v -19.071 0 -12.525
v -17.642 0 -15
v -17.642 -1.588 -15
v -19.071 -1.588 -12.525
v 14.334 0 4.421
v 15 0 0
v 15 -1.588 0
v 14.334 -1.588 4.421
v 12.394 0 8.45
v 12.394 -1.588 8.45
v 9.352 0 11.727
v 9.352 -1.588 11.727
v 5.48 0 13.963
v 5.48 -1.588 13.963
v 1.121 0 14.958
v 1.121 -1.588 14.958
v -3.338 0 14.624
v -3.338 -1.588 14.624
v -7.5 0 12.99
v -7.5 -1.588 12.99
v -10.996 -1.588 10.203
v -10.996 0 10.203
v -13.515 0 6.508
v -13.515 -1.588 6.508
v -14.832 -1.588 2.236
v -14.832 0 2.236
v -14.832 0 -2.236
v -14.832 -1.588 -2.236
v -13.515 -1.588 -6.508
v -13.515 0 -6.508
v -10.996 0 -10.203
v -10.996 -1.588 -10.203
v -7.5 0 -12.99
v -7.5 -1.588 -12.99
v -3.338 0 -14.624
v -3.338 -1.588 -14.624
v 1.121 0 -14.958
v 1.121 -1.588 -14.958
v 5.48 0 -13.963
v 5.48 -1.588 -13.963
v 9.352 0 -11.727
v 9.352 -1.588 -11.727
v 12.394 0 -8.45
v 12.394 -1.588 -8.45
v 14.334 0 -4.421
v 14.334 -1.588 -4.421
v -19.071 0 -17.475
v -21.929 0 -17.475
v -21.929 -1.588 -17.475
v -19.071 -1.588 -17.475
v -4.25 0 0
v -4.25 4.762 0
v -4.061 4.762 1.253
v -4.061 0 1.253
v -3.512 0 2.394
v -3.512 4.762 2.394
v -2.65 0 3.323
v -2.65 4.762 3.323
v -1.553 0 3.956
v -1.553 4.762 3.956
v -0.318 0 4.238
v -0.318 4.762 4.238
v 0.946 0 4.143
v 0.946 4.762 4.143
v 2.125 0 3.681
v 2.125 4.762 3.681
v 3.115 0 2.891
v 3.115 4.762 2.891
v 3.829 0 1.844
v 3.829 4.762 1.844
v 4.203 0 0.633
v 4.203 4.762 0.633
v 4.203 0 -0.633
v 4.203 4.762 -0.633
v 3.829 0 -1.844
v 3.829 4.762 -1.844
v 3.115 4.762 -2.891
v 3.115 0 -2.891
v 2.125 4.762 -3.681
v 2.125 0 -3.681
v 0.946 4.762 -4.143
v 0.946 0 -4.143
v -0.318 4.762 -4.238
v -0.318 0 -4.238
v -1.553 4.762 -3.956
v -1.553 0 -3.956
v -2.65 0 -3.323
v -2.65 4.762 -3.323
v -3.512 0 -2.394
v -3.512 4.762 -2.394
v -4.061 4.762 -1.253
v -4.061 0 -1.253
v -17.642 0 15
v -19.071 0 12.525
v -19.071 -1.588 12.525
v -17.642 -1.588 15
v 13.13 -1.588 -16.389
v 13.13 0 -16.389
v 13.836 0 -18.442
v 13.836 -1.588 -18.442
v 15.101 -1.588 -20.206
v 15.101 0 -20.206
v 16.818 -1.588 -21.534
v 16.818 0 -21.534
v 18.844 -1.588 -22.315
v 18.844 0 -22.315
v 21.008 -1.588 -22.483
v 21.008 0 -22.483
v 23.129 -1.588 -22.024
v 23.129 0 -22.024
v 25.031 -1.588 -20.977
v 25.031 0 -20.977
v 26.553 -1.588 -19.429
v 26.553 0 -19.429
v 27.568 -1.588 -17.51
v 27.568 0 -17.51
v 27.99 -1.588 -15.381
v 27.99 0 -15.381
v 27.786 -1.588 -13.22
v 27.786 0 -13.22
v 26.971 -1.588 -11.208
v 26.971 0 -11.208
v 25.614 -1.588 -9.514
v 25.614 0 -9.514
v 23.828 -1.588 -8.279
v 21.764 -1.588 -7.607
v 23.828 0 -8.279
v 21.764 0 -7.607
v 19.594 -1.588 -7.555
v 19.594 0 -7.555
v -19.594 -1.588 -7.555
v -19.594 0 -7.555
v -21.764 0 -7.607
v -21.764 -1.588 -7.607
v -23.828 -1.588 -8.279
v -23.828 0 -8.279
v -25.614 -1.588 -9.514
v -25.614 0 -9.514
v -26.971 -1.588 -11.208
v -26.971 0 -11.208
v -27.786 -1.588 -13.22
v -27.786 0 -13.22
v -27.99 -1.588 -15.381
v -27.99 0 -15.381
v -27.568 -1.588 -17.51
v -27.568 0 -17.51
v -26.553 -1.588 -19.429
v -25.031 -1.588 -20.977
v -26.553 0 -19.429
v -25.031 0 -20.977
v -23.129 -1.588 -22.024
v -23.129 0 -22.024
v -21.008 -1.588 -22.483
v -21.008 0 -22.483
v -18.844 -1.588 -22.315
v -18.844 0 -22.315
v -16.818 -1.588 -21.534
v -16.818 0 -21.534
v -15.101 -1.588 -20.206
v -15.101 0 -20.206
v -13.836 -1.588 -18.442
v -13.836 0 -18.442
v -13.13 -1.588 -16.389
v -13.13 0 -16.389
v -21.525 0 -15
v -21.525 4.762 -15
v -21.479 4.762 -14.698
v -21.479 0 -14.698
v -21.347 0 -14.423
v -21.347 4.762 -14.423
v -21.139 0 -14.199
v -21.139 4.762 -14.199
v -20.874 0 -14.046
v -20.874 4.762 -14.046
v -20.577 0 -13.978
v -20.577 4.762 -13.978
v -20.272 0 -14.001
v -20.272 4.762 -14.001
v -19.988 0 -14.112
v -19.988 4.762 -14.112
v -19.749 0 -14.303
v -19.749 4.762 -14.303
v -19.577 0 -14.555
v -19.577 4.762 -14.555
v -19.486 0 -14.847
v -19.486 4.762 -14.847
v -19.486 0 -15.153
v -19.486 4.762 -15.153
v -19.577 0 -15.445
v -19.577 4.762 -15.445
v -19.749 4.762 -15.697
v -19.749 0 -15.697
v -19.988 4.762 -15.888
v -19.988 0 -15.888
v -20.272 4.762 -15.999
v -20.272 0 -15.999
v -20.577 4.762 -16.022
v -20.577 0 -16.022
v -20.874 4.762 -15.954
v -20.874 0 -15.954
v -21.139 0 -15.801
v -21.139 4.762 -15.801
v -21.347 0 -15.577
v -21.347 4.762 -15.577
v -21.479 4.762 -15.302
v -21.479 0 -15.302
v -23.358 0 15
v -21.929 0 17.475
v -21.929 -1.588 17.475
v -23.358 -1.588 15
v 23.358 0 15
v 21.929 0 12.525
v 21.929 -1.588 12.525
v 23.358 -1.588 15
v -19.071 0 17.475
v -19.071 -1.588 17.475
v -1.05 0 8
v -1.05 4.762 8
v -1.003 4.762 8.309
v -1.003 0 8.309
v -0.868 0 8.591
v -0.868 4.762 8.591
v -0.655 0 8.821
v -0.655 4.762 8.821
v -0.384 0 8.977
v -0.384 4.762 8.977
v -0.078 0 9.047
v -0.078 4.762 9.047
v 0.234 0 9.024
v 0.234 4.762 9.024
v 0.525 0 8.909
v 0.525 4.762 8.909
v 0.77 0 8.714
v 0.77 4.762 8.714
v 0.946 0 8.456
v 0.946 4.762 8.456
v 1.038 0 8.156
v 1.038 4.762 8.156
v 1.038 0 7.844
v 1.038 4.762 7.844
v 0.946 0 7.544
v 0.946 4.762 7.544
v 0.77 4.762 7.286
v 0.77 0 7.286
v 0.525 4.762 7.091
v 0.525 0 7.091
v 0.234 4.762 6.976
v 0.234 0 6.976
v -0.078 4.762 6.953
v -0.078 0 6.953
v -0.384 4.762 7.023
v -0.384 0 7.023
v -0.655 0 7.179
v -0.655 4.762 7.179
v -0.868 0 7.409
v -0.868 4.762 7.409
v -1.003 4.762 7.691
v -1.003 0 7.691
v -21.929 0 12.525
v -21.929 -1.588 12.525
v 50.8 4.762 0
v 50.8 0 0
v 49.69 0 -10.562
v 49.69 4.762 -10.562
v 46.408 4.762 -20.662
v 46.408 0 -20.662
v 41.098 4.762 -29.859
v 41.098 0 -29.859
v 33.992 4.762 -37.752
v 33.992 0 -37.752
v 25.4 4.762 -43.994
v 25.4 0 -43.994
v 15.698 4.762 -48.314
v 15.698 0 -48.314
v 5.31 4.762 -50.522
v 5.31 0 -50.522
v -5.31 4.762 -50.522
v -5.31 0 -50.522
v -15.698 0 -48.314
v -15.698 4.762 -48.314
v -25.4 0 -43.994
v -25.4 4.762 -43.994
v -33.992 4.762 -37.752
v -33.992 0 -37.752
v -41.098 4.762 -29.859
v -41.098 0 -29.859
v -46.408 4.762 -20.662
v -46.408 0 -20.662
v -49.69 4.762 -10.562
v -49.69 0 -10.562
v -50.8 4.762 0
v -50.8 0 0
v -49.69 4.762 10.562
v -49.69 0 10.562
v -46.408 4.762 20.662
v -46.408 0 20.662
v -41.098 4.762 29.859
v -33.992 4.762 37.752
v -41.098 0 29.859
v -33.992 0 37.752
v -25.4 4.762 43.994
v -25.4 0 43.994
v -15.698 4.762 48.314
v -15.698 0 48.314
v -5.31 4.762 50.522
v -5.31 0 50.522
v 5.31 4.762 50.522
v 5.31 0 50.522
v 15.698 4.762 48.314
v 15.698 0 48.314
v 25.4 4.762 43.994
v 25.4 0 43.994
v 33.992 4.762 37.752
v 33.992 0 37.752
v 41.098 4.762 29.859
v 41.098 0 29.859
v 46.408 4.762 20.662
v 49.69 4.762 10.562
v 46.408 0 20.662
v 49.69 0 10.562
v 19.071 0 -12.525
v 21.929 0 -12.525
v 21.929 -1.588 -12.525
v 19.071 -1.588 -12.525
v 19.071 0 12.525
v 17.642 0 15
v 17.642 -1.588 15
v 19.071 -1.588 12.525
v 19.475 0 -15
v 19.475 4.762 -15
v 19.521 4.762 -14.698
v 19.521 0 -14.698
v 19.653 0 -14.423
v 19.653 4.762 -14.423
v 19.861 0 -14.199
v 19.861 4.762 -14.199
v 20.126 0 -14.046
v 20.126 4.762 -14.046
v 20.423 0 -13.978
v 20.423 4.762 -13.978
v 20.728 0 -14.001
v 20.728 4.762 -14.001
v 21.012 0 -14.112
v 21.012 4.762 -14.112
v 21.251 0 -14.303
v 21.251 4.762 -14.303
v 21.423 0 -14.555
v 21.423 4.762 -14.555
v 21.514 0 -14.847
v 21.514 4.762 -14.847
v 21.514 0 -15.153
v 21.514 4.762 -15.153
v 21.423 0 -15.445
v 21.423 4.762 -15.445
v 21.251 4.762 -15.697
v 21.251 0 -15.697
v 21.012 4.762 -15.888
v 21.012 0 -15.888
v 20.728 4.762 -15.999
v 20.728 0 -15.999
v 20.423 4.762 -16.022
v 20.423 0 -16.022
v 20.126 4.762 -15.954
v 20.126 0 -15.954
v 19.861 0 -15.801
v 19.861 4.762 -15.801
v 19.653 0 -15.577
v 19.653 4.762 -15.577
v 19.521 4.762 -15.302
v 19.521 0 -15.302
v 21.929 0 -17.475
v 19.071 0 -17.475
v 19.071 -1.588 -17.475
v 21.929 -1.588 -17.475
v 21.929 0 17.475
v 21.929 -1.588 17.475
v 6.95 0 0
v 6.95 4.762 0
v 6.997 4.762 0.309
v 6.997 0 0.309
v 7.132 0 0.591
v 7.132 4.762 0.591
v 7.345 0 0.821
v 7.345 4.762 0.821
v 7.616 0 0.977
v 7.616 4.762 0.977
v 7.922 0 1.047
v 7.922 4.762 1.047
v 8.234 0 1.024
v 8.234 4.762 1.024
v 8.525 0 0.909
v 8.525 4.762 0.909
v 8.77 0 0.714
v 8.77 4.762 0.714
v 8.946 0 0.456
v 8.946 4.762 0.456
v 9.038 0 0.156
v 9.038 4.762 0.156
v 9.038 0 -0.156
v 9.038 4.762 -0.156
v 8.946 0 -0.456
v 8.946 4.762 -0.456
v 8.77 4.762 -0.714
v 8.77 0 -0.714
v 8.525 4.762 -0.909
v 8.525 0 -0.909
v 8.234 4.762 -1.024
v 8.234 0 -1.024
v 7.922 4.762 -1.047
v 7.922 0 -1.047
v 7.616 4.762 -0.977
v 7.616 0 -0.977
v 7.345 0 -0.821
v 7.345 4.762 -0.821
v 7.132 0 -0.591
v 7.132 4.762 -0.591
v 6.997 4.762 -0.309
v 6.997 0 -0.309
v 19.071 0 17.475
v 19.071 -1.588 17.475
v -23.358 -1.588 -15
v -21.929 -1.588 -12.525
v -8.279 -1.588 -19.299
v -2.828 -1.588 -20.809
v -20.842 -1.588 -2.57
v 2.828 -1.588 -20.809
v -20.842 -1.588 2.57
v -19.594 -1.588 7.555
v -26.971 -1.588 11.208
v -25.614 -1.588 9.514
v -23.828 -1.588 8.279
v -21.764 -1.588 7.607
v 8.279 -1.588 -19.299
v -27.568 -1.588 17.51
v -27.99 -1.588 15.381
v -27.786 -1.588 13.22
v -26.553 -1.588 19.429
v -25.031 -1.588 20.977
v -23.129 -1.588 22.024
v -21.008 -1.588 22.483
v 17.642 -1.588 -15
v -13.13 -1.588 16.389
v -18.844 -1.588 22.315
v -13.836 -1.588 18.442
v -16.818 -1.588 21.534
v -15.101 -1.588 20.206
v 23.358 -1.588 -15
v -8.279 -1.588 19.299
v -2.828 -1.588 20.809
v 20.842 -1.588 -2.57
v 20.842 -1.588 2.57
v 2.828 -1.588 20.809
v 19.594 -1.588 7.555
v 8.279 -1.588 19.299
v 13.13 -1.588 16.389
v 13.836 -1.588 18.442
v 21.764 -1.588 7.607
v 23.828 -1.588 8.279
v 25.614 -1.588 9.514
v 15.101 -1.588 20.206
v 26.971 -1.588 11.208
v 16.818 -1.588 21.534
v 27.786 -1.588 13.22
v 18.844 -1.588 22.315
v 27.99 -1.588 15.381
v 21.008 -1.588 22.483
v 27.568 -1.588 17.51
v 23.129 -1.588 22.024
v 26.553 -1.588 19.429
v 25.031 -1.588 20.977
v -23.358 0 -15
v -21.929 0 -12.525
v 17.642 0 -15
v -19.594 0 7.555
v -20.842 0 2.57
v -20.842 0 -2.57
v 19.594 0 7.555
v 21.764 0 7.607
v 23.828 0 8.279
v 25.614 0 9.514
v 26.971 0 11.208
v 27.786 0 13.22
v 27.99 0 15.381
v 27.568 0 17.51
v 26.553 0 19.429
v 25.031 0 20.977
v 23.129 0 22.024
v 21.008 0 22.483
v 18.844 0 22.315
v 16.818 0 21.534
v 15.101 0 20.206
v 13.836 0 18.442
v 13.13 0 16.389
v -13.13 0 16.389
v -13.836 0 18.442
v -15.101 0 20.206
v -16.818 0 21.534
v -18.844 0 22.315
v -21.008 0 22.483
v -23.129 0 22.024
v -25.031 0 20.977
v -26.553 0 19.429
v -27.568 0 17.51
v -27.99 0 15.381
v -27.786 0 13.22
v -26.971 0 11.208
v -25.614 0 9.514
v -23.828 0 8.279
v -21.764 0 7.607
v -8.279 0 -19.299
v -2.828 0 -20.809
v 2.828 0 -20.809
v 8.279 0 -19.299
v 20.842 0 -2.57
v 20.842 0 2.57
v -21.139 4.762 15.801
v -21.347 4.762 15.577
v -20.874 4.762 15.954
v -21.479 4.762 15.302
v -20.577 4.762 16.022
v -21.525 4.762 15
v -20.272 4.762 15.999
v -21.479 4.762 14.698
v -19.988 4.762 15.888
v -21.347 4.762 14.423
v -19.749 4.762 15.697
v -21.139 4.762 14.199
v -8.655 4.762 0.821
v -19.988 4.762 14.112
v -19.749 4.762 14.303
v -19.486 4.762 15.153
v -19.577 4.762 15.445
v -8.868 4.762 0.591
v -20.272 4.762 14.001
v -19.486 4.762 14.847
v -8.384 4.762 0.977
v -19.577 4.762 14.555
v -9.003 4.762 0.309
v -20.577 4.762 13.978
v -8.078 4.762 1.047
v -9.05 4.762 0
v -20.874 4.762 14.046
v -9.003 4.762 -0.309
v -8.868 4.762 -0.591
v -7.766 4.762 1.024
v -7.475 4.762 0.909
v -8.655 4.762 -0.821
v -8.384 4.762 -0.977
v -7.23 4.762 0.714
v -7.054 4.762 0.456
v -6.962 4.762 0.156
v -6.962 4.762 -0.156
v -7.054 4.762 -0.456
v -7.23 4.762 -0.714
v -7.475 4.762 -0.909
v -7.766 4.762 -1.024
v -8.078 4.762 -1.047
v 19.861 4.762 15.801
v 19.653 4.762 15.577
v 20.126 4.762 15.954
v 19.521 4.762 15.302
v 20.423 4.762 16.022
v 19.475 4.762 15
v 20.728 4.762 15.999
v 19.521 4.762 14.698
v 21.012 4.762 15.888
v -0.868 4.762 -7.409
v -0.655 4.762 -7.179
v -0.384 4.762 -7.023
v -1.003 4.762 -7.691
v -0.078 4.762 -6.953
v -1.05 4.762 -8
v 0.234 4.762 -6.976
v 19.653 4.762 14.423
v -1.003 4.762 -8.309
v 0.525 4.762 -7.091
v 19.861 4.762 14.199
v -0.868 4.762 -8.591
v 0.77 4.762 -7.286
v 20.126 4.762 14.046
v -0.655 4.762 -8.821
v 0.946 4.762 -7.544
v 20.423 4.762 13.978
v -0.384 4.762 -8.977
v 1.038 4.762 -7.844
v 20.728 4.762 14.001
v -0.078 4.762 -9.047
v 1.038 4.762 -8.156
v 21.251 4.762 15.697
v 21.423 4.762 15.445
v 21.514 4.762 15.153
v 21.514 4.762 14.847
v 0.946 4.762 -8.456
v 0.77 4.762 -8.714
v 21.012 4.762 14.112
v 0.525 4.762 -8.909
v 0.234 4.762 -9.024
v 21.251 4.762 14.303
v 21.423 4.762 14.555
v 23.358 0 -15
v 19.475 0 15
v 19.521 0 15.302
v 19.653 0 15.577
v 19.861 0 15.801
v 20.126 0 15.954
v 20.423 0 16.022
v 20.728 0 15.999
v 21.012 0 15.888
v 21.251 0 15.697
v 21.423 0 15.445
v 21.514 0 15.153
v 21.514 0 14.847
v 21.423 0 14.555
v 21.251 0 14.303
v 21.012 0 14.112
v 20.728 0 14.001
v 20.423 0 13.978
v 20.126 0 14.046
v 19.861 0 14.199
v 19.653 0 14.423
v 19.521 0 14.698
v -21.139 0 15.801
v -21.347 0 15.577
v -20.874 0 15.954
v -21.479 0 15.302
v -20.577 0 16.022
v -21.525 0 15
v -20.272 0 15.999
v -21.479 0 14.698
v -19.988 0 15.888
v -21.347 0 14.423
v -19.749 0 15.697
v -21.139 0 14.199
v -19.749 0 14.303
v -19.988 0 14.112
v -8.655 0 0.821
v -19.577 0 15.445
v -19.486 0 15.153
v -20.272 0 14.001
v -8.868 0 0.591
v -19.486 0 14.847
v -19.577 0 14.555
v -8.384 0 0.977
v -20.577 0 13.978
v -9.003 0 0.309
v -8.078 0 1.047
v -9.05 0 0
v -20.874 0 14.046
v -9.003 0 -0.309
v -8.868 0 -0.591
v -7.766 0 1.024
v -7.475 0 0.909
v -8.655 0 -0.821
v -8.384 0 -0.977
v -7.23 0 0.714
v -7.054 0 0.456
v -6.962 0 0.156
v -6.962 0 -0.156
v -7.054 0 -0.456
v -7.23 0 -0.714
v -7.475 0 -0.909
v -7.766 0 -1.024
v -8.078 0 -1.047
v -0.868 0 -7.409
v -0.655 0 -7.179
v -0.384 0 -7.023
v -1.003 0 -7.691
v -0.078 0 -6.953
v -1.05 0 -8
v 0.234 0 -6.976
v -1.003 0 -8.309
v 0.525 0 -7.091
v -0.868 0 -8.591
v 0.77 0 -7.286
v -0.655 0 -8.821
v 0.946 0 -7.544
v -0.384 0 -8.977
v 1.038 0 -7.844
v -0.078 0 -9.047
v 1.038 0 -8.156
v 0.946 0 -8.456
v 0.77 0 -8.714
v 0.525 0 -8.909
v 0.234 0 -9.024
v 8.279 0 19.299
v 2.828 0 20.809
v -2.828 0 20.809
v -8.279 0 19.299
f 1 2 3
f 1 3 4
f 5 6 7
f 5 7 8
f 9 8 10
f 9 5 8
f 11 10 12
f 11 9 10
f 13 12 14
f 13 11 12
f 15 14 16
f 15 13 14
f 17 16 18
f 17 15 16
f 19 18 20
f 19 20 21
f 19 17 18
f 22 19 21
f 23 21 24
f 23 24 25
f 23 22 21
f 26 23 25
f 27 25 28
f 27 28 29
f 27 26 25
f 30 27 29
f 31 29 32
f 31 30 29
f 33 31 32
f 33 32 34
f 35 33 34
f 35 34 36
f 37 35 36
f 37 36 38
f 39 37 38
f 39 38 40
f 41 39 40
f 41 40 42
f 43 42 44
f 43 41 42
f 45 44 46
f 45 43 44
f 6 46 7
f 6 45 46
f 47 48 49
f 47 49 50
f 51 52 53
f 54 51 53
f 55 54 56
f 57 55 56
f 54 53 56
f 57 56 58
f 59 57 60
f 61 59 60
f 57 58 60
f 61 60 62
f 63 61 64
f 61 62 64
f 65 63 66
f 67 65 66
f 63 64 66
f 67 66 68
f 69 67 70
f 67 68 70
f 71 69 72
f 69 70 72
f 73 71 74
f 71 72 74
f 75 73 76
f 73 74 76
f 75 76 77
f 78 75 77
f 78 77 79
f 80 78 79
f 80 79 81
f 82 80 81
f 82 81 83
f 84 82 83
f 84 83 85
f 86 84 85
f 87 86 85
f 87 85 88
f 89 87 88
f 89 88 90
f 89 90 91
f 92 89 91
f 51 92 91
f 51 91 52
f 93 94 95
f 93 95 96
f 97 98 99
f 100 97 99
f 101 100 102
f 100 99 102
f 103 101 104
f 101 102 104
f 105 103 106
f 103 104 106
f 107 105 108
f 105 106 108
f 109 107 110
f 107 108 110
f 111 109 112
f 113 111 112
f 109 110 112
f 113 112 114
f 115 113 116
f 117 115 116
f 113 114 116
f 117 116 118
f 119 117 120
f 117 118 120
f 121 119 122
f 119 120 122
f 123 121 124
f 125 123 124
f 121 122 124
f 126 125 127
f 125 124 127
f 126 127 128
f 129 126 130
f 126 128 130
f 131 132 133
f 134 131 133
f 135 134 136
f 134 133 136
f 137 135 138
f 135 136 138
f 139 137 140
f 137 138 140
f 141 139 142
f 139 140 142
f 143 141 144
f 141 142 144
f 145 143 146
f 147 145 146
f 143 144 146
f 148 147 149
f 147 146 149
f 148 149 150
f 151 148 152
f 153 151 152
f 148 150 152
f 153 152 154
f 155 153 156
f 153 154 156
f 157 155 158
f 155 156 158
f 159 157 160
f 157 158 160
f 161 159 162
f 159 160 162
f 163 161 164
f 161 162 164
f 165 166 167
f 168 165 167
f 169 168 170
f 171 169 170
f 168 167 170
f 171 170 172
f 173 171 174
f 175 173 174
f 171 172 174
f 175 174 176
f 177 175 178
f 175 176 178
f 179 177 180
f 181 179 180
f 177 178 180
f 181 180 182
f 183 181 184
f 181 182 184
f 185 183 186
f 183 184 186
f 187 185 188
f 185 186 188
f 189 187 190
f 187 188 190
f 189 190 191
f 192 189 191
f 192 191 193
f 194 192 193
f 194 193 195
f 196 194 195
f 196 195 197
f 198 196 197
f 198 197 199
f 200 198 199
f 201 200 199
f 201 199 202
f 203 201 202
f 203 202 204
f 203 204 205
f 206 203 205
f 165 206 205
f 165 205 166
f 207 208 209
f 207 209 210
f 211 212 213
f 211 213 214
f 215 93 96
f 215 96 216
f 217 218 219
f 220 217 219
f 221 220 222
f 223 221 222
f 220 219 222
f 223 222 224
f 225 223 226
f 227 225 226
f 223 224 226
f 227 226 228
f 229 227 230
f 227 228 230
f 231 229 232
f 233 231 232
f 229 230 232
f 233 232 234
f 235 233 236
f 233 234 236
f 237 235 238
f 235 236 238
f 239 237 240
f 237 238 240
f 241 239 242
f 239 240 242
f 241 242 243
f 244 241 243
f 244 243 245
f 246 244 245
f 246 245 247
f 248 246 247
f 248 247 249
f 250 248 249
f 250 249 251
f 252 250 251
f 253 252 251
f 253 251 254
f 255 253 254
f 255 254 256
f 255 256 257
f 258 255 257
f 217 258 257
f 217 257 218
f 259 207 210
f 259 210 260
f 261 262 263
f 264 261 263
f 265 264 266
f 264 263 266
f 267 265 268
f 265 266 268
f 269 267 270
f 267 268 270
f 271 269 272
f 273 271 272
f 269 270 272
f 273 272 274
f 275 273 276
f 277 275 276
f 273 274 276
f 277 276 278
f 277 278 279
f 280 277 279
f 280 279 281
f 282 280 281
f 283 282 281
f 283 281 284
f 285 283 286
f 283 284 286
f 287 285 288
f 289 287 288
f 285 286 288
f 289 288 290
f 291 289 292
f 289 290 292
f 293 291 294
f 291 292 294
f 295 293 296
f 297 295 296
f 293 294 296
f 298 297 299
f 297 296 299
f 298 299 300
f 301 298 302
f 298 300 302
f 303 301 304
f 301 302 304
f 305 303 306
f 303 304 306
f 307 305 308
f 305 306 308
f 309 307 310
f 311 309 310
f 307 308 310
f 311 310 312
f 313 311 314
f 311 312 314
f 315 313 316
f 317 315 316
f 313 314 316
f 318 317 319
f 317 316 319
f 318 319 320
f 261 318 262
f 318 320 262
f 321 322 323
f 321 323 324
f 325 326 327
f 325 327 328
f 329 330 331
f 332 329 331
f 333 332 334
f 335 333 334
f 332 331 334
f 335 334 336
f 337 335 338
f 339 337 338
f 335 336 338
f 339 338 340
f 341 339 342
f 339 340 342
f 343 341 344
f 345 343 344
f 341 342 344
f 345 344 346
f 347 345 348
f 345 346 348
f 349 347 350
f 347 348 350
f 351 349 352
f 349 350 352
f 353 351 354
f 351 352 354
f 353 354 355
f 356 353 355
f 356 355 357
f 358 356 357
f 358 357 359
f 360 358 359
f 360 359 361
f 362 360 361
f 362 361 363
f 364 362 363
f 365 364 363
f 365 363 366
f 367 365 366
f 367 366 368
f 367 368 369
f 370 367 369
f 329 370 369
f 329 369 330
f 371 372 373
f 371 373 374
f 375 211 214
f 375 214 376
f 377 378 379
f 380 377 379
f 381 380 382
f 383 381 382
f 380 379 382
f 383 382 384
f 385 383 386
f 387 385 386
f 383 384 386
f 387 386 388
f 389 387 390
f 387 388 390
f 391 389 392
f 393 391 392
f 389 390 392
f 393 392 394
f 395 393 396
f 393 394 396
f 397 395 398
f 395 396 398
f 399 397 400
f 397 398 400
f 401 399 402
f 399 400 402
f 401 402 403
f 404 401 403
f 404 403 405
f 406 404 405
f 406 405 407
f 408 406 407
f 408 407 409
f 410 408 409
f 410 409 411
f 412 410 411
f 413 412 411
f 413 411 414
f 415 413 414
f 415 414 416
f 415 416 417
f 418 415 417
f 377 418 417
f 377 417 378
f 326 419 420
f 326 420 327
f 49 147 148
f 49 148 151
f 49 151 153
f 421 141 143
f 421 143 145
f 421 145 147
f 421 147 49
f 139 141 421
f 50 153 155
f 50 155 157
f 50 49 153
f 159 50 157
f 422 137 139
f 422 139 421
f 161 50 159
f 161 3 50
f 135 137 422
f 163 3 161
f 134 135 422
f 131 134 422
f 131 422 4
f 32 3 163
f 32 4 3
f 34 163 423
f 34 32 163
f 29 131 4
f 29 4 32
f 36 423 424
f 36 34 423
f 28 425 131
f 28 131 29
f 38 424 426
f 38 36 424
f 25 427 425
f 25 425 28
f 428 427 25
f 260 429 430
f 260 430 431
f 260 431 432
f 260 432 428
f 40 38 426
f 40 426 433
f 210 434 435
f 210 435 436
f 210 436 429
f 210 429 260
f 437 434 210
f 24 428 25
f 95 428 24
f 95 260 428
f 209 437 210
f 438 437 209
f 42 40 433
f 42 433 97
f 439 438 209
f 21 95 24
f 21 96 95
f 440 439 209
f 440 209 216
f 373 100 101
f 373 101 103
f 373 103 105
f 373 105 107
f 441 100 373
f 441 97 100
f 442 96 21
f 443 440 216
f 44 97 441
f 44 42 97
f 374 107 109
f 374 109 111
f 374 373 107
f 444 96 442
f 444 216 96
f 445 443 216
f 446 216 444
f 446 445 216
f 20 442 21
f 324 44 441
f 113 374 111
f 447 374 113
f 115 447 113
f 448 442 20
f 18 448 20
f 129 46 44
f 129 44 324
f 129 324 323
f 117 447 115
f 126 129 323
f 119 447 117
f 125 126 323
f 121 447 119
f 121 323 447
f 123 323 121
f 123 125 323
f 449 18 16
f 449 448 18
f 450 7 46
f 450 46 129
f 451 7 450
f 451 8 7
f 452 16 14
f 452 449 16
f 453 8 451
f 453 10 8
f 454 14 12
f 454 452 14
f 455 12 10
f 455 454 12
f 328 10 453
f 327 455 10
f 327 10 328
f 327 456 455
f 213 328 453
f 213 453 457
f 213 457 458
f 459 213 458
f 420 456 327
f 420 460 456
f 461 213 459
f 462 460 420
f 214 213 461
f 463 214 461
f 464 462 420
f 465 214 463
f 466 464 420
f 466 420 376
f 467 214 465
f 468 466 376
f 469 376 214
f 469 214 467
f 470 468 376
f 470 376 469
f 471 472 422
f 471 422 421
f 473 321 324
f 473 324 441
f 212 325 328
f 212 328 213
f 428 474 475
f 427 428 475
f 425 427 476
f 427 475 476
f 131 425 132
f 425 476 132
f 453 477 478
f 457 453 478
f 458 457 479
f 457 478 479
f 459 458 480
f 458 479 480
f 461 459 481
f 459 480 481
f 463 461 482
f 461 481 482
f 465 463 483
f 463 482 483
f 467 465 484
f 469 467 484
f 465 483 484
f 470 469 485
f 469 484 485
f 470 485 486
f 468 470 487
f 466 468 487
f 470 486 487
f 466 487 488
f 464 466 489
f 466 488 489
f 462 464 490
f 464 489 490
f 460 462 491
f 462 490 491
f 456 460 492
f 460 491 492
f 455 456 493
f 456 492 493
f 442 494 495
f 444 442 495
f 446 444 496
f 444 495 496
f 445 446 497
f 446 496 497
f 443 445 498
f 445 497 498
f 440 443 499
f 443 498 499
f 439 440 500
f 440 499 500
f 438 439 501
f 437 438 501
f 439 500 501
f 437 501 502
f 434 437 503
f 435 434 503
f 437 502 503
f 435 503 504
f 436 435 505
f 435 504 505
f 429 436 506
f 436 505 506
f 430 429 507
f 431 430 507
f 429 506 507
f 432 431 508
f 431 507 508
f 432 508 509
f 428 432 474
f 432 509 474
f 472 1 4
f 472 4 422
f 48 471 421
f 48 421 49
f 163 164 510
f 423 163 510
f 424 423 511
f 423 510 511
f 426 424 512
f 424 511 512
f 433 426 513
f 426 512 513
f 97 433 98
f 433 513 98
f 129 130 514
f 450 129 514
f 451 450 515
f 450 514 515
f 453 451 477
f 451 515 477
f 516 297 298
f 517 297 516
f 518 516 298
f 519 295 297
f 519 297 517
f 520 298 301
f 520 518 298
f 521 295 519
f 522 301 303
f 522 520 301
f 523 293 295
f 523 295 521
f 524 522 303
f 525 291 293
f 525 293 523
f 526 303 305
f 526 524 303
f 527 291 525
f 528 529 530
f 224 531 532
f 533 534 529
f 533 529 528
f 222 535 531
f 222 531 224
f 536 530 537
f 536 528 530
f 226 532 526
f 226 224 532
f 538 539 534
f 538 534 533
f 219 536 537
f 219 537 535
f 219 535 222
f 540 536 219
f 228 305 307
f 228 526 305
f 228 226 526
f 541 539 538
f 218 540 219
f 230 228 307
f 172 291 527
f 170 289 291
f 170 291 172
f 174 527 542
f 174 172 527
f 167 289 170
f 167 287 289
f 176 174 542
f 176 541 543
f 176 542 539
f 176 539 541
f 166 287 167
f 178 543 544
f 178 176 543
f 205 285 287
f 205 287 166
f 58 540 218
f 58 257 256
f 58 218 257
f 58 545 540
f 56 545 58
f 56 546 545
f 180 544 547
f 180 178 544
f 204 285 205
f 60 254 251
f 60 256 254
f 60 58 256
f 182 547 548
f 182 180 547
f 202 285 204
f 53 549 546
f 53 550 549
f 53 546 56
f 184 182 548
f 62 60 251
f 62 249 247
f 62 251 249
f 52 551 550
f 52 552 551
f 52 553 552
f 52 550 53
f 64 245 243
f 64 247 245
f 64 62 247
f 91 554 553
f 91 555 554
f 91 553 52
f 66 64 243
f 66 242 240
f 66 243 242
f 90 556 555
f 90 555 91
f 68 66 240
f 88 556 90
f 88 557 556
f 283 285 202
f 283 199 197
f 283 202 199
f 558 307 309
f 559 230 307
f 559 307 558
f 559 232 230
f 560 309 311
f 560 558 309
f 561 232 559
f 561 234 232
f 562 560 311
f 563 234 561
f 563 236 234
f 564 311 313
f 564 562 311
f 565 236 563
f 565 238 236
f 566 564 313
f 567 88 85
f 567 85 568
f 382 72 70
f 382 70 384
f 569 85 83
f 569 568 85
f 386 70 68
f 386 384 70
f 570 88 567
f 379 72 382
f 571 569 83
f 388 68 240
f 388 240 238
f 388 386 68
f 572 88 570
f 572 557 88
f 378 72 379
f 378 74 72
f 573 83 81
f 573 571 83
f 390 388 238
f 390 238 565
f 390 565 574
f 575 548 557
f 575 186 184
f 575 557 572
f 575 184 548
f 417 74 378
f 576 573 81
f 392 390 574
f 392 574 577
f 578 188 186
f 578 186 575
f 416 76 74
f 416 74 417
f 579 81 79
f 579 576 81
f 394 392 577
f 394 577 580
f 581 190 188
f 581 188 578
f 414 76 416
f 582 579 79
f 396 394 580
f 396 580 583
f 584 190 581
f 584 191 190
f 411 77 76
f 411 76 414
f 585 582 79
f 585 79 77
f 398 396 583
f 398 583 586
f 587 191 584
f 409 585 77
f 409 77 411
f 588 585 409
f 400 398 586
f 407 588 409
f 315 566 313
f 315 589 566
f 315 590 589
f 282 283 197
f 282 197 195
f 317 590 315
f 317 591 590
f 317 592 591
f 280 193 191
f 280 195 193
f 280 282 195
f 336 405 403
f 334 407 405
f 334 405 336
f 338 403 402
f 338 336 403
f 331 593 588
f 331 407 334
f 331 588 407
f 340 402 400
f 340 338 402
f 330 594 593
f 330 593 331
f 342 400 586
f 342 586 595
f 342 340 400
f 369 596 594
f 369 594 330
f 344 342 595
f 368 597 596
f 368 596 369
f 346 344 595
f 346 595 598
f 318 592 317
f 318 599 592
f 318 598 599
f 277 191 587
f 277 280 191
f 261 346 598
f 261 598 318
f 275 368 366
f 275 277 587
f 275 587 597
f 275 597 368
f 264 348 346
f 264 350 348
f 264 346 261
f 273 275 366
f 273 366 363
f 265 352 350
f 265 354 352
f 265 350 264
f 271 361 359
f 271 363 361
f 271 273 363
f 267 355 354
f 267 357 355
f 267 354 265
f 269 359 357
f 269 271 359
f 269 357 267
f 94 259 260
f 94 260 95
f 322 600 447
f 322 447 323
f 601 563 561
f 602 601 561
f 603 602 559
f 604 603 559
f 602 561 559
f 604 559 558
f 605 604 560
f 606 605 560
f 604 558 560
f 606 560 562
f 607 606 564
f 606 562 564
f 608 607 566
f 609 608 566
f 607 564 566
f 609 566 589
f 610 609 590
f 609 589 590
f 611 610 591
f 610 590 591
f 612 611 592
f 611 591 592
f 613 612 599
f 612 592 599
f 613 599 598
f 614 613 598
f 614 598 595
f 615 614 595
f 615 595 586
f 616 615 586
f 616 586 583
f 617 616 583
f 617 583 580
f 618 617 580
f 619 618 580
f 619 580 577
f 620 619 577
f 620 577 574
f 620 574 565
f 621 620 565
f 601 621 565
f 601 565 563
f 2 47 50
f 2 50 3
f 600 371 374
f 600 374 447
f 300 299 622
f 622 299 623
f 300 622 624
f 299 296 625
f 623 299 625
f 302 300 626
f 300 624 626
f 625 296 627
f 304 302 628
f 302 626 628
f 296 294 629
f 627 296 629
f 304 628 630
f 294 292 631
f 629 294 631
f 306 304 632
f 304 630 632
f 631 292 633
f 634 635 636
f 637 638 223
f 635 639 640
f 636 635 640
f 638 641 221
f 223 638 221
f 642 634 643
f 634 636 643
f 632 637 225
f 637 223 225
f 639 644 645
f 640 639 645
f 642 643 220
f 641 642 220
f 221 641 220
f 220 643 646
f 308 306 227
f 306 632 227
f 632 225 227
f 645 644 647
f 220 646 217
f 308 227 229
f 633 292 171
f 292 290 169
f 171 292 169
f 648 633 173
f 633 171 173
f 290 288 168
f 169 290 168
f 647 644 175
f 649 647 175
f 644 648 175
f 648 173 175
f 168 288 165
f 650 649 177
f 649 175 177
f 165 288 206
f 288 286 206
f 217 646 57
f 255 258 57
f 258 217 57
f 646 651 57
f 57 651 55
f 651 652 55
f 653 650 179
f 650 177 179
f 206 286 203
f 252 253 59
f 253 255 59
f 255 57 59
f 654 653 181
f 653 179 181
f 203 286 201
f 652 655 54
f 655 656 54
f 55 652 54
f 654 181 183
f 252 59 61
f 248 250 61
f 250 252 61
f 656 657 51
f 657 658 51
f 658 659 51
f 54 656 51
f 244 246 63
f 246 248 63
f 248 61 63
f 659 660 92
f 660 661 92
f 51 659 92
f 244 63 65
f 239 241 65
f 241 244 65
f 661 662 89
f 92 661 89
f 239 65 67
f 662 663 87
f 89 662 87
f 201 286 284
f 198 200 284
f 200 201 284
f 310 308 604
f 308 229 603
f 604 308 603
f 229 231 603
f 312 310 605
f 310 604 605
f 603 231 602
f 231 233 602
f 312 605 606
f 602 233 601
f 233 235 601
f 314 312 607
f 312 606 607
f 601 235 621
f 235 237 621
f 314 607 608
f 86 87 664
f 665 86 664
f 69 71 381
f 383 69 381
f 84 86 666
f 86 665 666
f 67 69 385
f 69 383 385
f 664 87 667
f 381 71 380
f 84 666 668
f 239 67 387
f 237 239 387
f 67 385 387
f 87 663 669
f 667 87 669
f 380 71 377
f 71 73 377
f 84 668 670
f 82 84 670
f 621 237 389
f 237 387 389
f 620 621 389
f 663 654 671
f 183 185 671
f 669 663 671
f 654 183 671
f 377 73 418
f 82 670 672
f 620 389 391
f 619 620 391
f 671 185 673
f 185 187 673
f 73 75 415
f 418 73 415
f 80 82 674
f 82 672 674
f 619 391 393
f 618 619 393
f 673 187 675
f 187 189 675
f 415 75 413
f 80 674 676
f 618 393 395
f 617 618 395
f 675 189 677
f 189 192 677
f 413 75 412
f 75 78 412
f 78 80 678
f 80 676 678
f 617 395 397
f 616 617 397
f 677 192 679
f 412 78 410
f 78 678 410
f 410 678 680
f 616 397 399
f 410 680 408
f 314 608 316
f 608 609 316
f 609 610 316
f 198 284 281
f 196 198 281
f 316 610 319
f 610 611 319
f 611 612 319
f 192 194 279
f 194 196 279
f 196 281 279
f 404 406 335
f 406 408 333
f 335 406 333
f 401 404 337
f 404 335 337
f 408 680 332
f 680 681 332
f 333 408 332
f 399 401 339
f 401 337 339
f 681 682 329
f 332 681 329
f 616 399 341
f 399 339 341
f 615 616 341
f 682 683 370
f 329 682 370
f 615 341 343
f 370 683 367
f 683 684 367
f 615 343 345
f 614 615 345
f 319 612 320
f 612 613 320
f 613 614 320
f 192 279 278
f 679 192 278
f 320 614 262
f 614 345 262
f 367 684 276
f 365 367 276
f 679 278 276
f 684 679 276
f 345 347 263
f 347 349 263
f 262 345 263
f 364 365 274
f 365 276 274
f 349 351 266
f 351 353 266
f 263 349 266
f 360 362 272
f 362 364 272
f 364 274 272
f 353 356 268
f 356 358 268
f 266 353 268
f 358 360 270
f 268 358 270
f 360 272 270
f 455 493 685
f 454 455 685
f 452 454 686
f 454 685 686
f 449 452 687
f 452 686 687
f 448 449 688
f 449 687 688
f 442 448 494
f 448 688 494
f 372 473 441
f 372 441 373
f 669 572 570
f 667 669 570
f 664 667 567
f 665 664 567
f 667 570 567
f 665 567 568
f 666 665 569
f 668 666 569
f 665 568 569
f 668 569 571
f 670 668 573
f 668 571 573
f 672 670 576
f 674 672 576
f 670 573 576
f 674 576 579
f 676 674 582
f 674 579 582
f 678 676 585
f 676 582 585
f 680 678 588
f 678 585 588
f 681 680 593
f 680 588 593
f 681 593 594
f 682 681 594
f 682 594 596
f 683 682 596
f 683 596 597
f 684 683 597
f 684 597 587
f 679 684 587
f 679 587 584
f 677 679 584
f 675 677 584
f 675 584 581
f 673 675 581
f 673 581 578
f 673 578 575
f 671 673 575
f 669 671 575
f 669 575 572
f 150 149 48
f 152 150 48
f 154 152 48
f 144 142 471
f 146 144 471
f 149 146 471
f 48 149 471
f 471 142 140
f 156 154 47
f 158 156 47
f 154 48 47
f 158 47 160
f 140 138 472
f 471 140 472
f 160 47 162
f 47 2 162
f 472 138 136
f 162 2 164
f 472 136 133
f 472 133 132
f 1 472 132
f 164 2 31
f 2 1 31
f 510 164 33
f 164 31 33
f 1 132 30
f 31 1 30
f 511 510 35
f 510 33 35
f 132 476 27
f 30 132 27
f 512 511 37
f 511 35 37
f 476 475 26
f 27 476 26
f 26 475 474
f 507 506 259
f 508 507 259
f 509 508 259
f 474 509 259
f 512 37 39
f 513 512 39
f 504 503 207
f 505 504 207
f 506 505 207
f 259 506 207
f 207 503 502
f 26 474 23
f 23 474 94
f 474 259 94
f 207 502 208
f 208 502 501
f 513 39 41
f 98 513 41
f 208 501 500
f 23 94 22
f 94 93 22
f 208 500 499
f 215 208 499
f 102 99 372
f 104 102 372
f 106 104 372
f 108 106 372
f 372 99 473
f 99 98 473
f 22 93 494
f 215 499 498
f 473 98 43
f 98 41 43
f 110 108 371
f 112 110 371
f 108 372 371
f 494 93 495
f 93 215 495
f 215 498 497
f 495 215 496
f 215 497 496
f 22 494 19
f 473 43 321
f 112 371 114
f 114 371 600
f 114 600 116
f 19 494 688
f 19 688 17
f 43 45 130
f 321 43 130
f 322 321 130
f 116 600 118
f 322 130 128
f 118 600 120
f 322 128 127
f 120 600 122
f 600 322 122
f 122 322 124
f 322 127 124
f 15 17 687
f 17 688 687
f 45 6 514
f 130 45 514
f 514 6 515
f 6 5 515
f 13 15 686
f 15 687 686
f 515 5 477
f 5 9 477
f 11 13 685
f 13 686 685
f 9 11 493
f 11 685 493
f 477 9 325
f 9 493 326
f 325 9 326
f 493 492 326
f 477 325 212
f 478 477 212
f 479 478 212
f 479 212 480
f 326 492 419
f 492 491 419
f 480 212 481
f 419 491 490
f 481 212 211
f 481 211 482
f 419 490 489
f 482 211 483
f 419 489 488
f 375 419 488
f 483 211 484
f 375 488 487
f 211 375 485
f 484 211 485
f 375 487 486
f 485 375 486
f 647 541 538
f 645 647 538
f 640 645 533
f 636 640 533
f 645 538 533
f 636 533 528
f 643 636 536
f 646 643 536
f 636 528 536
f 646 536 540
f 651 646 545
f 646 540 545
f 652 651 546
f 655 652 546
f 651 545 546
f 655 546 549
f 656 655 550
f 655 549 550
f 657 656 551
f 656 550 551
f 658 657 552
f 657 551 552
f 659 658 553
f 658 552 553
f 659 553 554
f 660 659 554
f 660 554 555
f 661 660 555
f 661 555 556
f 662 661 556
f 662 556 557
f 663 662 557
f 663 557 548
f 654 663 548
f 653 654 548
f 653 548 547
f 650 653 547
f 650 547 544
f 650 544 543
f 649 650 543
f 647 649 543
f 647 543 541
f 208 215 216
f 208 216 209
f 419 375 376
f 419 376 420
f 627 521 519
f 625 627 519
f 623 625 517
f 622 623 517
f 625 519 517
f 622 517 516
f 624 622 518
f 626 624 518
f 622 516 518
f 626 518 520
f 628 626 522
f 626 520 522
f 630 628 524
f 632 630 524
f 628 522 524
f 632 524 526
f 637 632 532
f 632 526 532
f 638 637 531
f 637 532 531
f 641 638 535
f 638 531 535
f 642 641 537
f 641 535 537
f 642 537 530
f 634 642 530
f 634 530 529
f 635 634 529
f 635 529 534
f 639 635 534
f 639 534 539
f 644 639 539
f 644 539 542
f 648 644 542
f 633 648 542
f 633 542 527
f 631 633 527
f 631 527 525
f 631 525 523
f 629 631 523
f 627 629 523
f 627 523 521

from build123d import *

# Parameters (mm, degrees)
SKETCH1_R           = 50.8
BOSS_EXTRUDE1_DEPTH = 4.7625
SKETCH2_R           = 1.05
CUT_EXTRUDE1_DEPTH  = 5.7625
SKETCH3_R           = 4.25
CUT_EXTRUDE2_DEPTH  = 5.7625
SKETCH4_R           = 1.025
CUT_EXTRUDE3_DEPTH  = 5.7625
SKETCH6_R           = 15
BOSS_EXTRUDE2_DEPTH = 1.5875


with BuildPart() as part:
    # Sketch1 → Boss-Extrude1 (new body)
    with BuildSketch(Plane(origin=(0, 0, 0), x_dir=(1, 0, 0), z_dir=(0, 1, 0))):
        Circle(SKETCH1_R)
    extrude(amount=BOSS_EXTRUDE1_DEPTH)

    # Sketch2 → Cut-Extrude1 (cut, through all)
    with BuildSketch(Plane(origin=(0, 4.7625, 0), x_dir=(-1, 0, 0), z_dir=(0, 1, 0))):
        with Locations((0, 8)):
            Circle(SKETCH2_R)
        with Locations((-8, 0)):
            Circle(SKETCH2_R)
        with Locations((0, -8)):
            Circle(SKETCH2_R)
        with Locations((8, 0)):
            Circle(SKETCH2_R)
    extrude(amount=-CUT_EXTRUDE1_DEPTH, mode=Mode.SUBTRACT)

    # Sketch3 → Cut-Extrude2 (cut, through all)
    with BuildSketch(Plane(origin=(0, 4.7625, 0), x_dir=(-1, 0, 0), z_dir=(0, 1, 0))):
        Circle(SKETCH3_R)
    extrude(amount=-CUT_EXTRUDE2_DEPTH, mode=Mode.SUBTRACT)

    # Sketch4 → Cut-Extrude3 (cut, through all)
    with BuildSketch(Plane(origin=(0, 4.7625, 0), x_dir=(-1, 0, 0), z_dir=(0, 1, 0))):
        with Locations((-20.5, 15)):
            Circle(SKETCH4_R)
        with Locations((20.5, 15)):
            Circle(SKETCH4_R)
        with Locations((20.5, -15)):
            Circle(SKETCH4_R)
        with Locations((-20.5, -15)):
            Circle(SKETCH4_R)
    extrude(amount=-CUT_EXTRUDE3_DEPTH, mode=Mode.SUBTRACT)


with BuildPart() as body_2:
    # Sketch6 → Boss-Extrude2 (new body)
    with BuildSketch(Plane.XZ):
        with BuildLine():
            ThreePointArc((-13.129796139, 16.389278609), (-26.552727442, 19.428824958), (-19.593954345, 7.554929062))
            ThreePointArc((-19.593954345, 7.554929062), (-21, 0), (-19.593954345, -7.554929062))
            ThreePointArc((-19.593954345, -7.554929062), (-26.552727442, -19.428824958), (-13.129796139, -16.389278609))
            ThreePointArc((-13.129796139, -16.389278609), (0, -21), (13.129796139, -16.389278609))
            ThreePointArc((13.129796139, -16.389278609), (26.552727442, -19.428824958), (19.593954345, -7.554929062))
            ThreePointArc((19.593954345, -7.554929062), (21, 0), (19.593954345, 7.554929062))
            ThreePointArc((19.593954345, 7.554929062), (26.552727442, 19.428824958), (13.129796139, 16.389278609))
            ThreePointArc((13.129796139, 16.389278609), (0, 21), (-13.129796139, 16.389278609))
        make_face()
        Circle(SKETCH6_R, mode=Mode.SUBTRACT)
        Polygon((-17.642116168, 15), (-19.071058084, 17.475), (-21.928941916, 17.475), (-23.357883832, 15), (-21.928941916, 12.525), (-19.071058084, 12.525), align=None, mode=Mode.SUBTRACT)
        Polygon((21.928941916, 17.475), (19.071058084, 17.475), (17.642116168, 15), (19.071058084, 12.525), (21.928941916, 12.525), (23.357883832, 15), align=None, mode=Mode.SUBTRACT)
        Polygon((21.928941916, -12.525), (19.071058084, -12.525), (17.642116168, -15), (19.071058084, -17.475), (21.928941916, -17.475), (23.357883832, -15), align=None, mode=Mode.SUBTRACT)
        Polygon((-21.928941916, -12.525), (-23.357883832, -15), (-21.928941916, -17.475), (-19.071058084, -17.475), (-17.642116168, -15), (-19.071058084, -12.525), align=None, mode=Mode.SUBTRACT)
    extrude(amount=BOSS_EXTRUDE2_DEPTH)


solid = Compound([part.part, body_2.part])
